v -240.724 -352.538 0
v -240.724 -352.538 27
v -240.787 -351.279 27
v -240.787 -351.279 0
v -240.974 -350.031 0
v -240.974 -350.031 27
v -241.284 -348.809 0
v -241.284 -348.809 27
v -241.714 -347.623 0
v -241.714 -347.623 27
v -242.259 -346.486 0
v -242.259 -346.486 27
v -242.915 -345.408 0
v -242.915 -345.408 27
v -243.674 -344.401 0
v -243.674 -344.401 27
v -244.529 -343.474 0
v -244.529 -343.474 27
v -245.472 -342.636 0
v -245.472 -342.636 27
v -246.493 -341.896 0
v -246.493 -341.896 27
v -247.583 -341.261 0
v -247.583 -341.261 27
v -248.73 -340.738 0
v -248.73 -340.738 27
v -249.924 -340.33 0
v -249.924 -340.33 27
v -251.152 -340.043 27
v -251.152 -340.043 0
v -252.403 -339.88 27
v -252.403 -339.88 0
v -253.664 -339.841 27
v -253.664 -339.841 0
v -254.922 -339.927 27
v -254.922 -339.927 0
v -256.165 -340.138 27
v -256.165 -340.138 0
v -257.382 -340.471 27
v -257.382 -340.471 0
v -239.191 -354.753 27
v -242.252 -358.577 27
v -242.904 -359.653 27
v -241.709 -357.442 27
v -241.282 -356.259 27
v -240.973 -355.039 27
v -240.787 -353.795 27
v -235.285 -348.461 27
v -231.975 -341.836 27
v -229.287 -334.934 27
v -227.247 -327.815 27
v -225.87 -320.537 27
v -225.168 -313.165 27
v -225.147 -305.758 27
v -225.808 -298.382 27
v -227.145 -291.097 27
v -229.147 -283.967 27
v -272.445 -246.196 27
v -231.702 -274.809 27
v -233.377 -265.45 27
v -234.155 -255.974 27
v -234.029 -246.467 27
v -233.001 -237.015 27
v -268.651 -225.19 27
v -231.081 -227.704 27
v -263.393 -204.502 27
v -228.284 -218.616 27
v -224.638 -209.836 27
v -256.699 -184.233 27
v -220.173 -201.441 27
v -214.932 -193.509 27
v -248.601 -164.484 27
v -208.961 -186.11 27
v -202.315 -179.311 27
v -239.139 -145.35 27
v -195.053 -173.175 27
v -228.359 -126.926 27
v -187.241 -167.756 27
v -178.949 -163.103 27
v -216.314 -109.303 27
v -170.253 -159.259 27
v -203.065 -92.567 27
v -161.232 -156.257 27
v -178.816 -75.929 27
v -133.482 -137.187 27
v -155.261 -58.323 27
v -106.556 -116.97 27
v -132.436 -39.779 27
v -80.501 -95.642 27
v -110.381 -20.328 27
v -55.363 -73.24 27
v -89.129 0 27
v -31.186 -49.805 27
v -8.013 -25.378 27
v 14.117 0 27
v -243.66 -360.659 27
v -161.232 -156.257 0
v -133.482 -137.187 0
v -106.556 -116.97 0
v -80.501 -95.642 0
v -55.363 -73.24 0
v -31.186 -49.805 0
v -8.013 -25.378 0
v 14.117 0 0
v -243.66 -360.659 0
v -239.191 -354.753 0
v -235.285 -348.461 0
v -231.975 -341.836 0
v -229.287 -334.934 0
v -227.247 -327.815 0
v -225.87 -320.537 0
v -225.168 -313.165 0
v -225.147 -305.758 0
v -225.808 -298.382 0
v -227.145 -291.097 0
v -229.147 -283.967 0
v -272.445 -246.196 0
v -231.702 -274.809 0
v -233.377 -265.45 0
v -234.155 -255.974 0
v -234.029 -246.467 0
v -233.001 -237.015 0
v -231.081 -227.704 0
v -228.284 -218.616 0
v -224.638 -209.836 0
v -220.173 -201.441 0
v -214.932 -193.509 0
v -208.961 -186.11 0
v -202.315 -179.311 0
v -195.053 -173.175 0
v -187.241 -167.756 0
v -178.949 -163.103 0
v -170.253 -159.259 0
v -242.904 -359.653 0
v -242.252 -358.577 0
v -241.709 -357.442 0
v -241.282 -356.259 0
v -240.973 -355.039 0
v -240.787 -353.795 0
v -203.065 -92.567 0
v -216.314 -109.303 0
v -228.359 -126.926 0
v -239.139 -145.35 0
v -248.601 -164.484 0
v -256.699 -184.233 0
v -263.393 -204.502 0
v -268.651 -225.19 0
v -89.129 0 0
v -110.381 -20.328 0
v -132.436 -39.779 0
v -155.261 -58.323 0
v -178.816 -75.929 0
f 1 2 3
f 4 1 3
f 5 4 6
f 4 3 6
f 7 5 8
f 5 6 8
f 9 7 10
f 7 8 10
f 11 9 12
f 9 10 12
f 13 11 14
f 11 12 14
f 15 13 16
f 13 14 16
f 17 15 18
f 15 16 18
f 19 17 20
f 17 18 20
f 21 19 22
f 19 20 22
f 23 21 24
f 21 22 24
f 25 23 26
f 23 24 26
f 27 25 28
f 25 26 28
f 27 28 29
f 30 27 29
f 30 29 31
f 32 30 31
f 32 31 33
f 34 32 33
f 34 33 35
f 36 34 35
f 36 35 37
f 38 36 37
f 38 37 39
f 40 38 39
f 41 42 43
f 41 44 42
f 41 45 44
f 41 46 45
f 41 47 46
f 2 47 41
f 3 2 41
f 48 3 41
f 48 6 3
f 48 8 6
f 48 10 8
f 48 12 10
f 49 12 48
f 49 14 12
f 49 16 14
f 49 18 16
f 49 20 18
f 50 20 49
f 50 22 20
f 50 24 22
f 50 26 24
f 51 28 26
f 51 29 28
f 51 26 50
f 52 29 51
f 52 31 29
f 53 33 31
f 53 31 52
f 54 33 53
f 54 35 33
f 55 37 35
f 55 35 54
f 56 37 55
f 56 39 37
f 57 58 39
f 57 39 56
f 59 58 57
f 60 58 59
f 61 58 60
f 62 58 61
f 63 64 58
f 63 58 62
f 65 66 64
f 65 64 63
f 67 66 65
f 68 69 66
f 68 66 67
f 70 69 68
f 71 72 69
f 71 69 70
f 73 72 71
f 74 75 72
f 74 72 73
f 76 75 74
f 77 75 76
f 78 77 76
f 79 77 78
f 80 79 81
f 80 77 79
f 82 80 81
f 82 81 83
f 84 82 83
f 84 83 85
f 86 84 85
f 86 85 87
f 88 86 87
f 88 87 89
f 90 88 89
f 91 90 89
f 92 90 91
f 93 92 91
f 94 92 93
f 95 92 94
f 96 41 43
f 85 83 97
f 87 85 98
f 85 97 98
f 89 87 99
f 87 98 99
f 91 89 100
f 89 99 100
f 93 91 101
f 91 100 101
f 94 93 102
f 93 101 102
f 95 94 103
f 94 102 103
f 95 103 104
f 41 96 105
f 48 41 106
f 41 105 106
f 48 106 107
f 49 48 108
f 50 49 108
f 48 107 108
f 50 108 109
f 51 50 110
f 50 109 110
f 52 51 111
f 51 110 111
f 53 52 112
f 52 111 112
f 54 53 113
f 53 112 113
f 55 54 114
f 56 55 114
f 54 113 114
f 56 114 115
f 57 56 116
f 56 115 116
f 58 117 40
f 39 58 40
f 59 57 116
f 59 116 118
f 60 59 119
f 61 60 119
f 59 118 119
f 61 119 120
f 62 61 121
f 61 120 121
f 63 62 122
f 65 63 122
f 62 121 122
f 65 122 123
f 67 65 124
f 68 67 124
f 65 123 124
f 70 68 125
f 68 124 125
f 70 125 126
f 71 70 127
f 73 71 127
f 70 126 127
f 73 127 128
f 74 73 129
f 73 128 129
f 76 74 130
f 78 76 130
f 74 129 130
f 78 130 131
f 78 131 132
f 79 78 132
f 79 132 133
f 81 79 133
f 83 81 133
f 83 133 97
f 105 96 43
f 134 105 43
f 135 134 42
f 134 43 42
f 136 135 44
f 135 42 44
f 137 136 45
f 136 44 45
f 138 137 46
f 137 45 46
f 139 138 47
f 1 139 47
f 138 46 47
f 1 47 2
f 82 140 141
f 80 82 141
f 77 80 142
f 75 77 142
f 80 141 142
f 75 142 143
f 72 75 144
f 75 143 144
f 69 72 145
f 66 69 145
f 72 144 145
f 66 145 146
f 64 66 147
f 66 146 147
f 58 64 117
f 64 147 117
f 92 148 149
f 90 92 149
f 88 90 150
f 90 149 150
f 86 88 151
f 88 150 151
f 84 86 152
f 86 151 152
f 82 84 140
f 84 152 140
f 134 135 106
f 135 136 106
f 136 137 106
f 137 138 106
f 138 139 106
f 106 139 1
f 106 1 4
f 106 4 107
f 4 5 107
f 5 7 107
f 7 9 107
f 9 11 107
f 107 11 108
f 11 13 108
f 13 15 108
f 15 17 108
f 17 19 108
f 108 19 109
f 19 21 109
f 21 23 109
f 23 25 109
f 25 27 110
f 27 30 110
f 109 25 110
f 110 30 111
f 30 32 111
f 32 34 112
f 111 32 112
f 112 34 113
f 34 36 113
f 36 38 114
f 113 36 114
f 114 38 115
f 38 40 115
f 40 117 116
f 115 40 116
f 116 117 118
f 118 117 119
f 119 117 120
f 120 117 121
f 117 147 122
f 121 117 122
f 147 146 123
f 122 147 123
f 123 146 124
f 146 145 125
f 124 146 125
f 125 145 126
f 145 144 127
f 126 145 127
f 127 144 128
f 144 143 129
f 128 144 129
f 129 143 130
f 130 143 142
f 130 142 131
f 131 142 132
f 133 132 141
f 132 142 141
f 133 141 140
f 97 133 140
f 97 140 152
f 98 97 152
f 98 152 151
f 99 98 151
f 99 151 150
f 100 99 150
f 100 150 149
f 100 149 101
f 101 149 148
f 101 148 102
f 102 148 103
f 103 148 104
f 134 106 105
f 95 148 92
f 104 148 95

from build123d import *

# Parameters (mm, degrees)
F1_DEPTH = 27
F4_DEPTH = 29.13629
F5_W     = 556.250348
F5_H     = 232.422799
F6_DEPTH = 50


with BuildPart() as f1:
    # F0 (on Top) → F1 (new body)
    with BuildSketch(Plane.XY):
        with BuildLine():
            ThreePointArc((103.141751, 130.827628), (147.000525, 190.646497), (220.000119, 203.797485))
            Line((220.000119, 203.797485), (331.982739, 180.898076))
            ThreePointArc((331.982739, 180.898076), (297.759937, 202.019334), (260.019282, 215.909999))
            ThreePointArc((260.019282, 215.909999), (247.785722, 214.790312), (240.327458, 224.551869))
            ThreePointArc((240.327458, 224.551869), (186.047212, 230.450127), (134.405585, 212.722269))
            ThreePointArc((134.405585, 212.722269), (96.675345, 191.925026), (57.181264, 174.711255))
            ThreePointArc((57.181264, 174.711255), (38.789615, 163.844419), (25.042325, 147.493489))
            ThreePointArc((25.042325, 147.493489), (-75.160431, 14.302014), (-203.064791, -92.567234))
            ThreePointArc((-203.064791, -92.567234), (-248.600788, -164.483519), (-272.445342, -246.19592))
            Line((-272.445342, -246.19592), (-253.424359, -365.238374))
            ThreePointArc((-253.424359, -365.238374), (-248.03197, -364.036727), (-243.660012, -360.659182))
            ThreePointArc((-243.660012, -360.659182), (-226.474264, -324.191868), (-229.146522, -283.966577))
            ThreePointArc((-229.146522, -283.966577), (-222.505303, -205.585554), (-161.231884, -156.257483))
            ThreePointArc((-161.231884, -156.257483), (-11.343038, -29.016538), (103.141751, 130.827628))
        make_face()
    extrude(amount=F1_DEPTH)

    # F3 (on face) → F4 (cut)
    with BuildSketch(Plane.XY.offset(27)):
        with BuildLine():
            ThreePointArc((-240.724359, -352.538374), (-262.404616, -343.558118), (-253.424359, -365.238374))
            ThreePointArc((-253.424359, -365.238374), (-248.03197, -364.036727), (-243.660012, -360.659182))
            ThreePointArc((-243.660012, -360.659182), (-241.4808, -356.855942), (-240.724359, -352.538374))
        make_face()
    extrude(amount=-F4_DEPTH, mode=Mode.SUBTRACT)

    # F5 (on face) → F6 (cut)
    with BuildSketch(Plane.XY):
        with Locations((93.210183, 116.211399)):
            Rectangle(F5_W, F5_H)
    extrude(amount=F6_DEPTH, mode=Mode.SUBTRACT)


solid = f1.part
